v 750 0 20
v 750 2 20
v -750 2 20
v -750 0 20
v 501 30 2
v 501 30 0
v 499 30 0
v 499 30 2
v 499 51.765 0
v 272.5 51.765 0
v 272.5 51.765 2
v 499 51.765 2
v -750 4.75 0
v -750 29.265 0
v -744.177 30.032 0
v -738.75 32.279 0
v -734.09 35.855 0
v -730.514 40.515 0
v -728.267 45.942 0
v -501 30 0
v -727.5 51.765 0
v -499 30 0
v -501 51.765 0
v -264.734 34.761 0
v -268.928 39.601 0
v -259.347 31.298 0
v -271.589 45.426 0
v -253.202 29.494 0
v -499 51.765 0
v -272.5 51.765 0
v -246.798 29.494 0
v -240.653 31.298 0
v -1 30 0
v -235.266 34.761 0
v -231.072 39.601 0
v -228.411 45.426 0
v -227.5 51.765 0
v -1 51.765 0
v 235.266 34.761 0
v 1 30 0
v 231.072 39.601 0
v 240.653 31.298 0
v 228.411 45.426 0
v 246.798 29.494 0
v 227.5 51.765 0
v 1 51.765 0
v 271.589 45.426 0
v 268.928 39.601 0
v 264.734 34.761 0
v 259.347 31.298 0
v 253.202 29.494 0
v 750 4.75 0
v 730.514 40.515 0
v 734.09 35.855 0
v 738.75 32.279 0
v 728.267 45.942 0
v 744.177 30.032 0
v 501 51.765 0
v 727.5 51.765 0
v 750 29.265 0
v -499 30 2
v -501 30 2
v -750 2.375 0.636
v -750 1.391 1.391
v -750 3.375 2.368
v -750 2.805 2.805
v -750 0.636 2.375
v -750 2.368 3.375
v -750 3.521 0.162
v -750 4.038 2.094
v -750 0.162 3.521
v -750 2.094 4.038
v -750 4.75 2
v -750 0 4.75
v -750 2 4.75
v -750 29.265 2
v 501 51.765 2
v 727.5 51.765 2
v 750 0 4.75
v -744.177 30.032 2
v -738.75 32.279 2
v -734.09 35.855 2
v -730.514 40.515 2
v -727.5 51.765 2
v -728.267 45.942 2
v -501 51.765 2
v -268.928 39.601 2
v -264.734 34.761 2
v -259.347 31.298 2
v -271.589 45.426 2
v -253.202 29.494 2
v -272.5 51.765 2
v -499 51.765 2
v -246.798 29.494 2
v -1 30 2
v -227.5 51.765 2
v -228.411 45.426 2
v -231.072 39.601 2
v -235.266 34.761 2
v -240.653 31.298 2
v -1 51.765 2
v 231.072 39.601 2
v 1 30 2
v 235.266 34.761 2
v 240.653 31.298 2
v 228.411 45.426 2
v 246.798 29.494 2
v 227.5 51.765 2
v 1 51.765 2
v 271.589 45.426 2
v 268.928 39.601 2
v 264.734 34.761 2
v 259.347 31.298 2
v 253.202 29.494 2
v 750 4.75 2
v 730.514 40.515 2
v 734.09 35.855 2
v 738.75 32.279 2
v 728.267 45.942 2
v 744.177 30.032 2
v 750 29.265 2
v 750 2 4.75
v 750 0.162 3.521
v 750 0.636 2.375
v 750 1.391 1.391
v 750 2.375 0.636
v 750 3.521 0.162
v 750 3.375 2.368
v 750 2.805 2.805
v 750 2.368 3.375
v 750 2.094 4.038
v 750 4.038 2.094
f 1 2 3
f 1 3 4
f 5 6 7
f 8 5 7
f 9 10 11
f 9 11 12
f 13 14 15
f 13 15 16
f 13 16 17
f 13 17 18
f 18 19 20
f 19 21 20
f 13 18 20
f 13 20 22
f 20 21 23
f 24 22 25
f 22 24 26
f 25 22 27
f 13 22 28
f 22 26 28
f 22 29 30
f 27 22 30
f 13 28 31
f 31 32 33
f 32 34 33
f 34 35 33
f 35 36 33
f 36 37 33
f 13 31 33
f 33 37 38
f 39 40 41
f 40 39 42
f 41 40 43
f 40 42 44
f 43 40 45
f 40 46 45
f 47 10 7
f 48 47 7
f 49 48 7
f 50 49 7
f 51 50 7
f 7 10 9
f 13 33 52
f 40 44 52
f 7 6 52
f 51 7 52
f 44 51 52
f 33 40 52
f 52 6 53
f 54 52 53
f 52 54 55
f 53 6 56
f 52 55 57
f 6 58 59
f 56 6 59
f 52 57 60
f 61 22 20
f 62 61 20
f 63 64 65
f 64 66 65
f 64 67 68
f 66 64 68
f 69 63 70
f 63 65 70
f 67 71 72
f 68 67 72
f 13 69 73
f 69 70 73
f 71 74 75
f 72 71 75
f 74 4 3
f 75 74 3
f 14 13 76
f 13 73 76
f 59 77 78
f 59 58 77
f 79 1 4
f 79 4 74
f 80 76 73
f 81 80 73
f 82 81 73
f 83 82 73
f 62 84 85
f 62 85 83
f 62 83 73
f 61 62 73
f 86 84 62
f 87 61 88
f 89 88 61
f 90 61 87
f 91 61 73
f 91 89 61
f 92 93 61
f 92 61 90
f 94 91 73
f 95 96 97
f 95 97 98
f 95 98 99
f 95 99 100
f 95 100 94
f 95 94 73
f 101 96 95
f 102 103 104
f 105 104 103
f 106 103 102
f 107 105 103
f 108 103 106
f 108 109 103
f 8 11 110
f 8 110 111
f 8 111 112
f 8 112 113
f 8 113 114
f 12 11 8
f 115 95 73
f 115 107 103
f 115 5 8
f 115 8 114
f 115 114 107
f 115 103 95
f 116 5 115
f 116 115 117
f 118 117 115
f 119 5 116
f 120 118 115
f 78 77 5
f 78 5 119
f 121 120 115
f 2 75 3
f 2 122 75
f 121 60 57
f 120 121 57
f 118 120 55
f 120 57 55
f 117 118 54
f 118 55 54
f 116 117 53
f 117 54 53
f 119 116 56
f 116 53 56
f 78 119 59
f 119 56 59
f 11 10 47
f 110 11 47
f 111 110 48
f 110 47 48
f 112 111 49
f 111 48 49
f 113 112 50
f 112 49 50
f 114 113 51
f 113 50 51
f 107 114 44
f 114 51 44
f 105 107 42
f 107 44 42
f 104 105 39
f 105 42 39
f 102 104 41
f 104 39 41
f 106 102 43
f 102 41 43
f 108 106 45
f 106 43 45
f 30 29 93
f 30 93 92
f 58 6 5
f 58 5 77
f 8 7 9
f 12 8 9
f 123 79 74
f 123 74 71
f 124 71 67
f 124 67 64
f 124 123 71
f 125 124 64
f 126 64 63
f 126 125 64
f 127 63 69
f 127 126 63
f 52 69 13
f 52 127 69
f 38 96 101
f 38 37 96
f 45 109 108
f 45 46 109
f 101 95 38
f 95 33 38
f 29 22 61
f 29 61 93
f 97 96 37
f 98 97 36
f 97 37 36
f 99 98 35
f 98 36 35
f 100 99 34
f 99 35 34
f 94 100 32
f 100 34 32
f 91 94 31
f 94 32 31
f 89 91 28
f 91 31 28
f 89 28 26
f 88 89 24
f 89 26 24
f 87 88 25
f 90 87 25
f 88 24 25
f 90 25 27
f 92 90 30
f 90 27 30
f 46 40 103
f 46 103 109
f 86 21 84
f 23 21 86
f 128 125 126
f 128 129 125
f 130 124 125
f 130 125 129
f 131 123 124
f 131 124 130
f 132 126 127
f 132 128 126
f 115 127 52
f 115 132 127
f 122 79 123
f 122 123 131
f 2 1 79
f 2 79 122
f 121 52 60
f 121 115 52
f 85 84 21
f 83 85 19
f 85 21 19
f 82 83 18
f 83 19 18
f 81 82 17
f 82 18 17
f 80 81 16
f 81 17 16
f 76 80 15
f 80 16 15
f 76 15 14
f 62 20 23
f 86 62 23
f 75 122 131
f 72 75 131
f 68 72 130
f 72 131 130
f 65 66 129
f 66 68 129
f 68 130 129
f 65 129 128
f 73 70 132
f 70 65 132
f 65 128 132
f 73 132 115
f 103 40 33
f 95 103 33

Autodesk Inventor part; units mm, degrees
ref_plane "YZ Plane" through (0, 0, 0) normal (1, 0, 0) x (0, 1, 0)
ref_plane "XZ Plane" through (0, 0, 0) normal (0, 1, 0) x (-1, 0, 0)
ref_plane "XY Plane" through (0, 0, 0) normal (0, 0, 1) x (1, 0, 0)
sketch "Sketch1" plane through (0, 0, 0) normal (0, 0, 1) x (1, 0, 0)
  line L0 (-750, 51.765) -> (750, 51.765)
  line L1 (750, 51.765) -> (750, 0)
  line L2 (750, 0) -> (-750, 0)
  line L3 (-750, 0) -> (-750, 51.765)
  point P0 (0, 0)
  point P1 (0, 0)
  dimension "d0" = 1500
  dimension "d1" = 51.765
extrude "Plate1" add sketch "Sketch1" along normal blind 2
sketch "Sketch2" plane through (750, 2, 0) normal (0, -1, 0) x (1, 0, 0)
  line L0 (-1500, 0) -> (0, 0)
  line L1 (0, 0) -> (0, 20)
  line L2 (0, 20) -> (-1500, 20)
  line L3 (-1500, 20) -> (-1500, 0)
edge flange "Flange1" height 20 angle 90 thickness 2 bend radius 2.75 thickness toward (0, -1, 0) relief round relief width 2 relief depth 1 edges at (0, 0, 2) wall of the first edge with corners at (-750, 2, 0) (750, 2, 0) (750, 2, 20) (-750, 2, 20)
bend "Bend1"
corner "Corner1"
sketch "Sketch5" plane through (0, 0, 0) normal (0, 0, -1) x (-1, 0, 0)
  line L0 (750, 51.765) -> (-750, 51.765) projected
  line L1 (-1, 30) -> (-1, 51.765)
  line L2 (750, 0) -> (-750, 0) projected
  line L3 (-1, 30) -> (1, 30)
  line L4 (1, 30) -> (1, 51.765)
  point P0 (0, 0)
  point P1 (0, 30)
  point P2 (0, 0)
  dimension "d27" = 2
  dimension "d29" = 30
extrude "Extrusion1" cut sketch "Sketch5" against normal through all
pattern_linear "Rectangular Pattern1" count 3 spacing 500 along (1, 0, 0) of "Extrusion1" first direction both ways yes
sketch "Sketch6" plane through (0, 0, 0) normal (0, 0, -1) x (-1, 0, 0)
  line L0 (-750, 51.765) -> (-750, 4.75) projected
  circle A0 centre (-750, 51.765) radius 22.5
  line L1 (-750, 51.765) -> (750, 51.765) projected
  line L2 (-499, 30) -> (-501, 30) construction
  line L3 (-499, 30) -> (-1, 30) construction
  line L4 (-1, 30) -> (-1, 51.765) construction
  line L5 (-1, 51.765) -> (-499, 51.765) projected
  circle A1 centre (-250, 51.765) radius 22.5
  point P0 (0, 0)
  point P1 (-727.5, 51.765)
  point P2 (-750, 29.265)
  point P3 (-250, 30)
  point P4 (-227.5, 51.765)
  point P5 (-272.5, 51.765)
  dimension "d24" = 45
extrude "Extrusion2" cut sketch "Sketch6" against normal through all contours L1 A0 L0 | L1 A1 picked at (-748.3311, 36.953) picked at (-248.2369, 40.8343)
mirror "Mirror1" about plane through (0, 0, 0) normal (1, 0, 0) of "Extrusion2"
sketch "Sketch7" plane through (0, 0, 2) normal (0, 0, 1) x (1, 0, 0)
  arc A0 (-750, 29.265) -> (-727.5, 51.765) centre (-750, 51.765) ccw projected
  line L0 (-750, 4.75) -> (-750, 29.265) projected
  line L1 (-750, 4.75) -> (750, 4.75) projected
  line L2 (750, 29.265) -> (750, 4.75) projected
  arc A1 (727.5, 51.765) -> (750, 29.265) centre (750, 51.765) ccw projected
  line L3 (501, 51.765) -> (727.5, 51.765) projected
  line L4 (501, 51.765) -> (501, 30) projected
  line L5 (501, 30) -> (499, 30) projected
  line L6 (499, 30) -> (499, 51.765) projected
  line L7 (1, 51.765) -> (227.5, 51.765) projected
  line L8 (1, 51.765) -> (1, 30) projected
  line L9 (1, 30) -> (-1, 30) projected
  line L10 (-1, 30) -> (-1, 51.765) projected
  line L11 (-499, 51.765) -> (-272.5, 51.765) projected
  line L12 (-499, 51.765) -> (-499, 30) projected
  line L13 (-499, 30) -> (-501, 30) projected
  line L14 (-501, 30) -> (-501, 51.765) projected
  line L15 (-727.5, 51.765) -> (-501, 51.765) projected
  line L16 (649, 50.765) -> (651, 50.765)
  line L17 (651, 50.765) -> (651, 51.765)
  line L18 (651, 51.765) -> (649, 51.765)
  line L19 (649, 51.765) -> (649, 50.765)
  line L20 (650, 4.75) -> (650, 51.765) construction
  line L21 (272.5, 51.765) -> (499, 51.765) projected
  arc A2 (227.5, 51.765) -> (272.5, 51.765) centre (250, 51.765) ccw projected
  line L22 (-227.5, 51.765) -> (-1, 51.765) projected
  arc A3 (-272.5, 51.765) -> (-227.5, 51.765) centre (-250, 51.765) ccw projected
  point P0 (0, 0)
  point P1 (650, 50.765)
  point P2 (649, 51.265)
  point P3 (650, 28.2575)
  dimension "d30" = 2
  dimension "d31" = 1
  dimension "d33" = 100
extrude "Extrusion3" [suppressed]
mirror "Mirror2" [suppressed]
sketch "Sketch9" plane through (0, 0, 2) normal (0, 0, 1) x (1, 0, 0)
  line L0 (494, 46.765) -> (494, 34.765) construction
  line L1 (494, 34.765) -> (294, 34.765) construction
  line L2 (294, 34.765) -> (294, 46.765) construction
  line L3 (294, 46.765) -> (494, 46.765) construction
  line L4 (499, 30) -> (499, 51.765) projected
  line L5 (1, 51.765) -> (499, 51.765) projected
  point P0 (0, 0)
  dimension "d38" = 200
  dimension "d39" = 12
  dimension "d42" = 5
  dimension "d43" = 5
mark "Mark3"
equation "\"d1\" = Стрингер_1"
equation "\"d27\" = d18"
equation "\"d29\" = Стрингер_глубина_паза"
equation "\"d43\" = d42"
equation "\"d2\" = Thickness"
equation "\"d3\" = BendReliefWidth"
equation "\"d4\" = BendReliefDepth"
equation "\"d5\" = MinimumRemnant"
equation "\"d6\" = TransitionRadius"
equation "\"d9\" = BendRadius"
equation "\"d10\" = CornerReliefSize"
equation "\"d11\" = GapSize"
equation "\"d12\" = JacobiRadiusSize"
equation "\"BendReliefWidth\" = Thickness"
equation "\"BendReliefDepth\" = 0.5 * Thickness"
equation "\"CornerReliefSize\" = 4 * Thickness"
equation "\"MinimumRemnant\" = 2 * Thickness"
equation "\"TransitionRadius\" = BendRadius"
equation "\"JacobiRadiusSize\" = BendRadius"
equation "\"GapSize\" = Thickness"
equation "\"d18\" = Thickness"
equation "\"qqqqqq\" = 67.35706"
equation "\"Стрингер_1\" = 51.765032"
equation "\"Стрингер_глубина_паза\" = 30"
equation "\"Thickness\" = 2"
equation "\"BendRadius\" = 2.75"
properties part number "MSC 061 stringer back ^" material "Stainless Steel"
